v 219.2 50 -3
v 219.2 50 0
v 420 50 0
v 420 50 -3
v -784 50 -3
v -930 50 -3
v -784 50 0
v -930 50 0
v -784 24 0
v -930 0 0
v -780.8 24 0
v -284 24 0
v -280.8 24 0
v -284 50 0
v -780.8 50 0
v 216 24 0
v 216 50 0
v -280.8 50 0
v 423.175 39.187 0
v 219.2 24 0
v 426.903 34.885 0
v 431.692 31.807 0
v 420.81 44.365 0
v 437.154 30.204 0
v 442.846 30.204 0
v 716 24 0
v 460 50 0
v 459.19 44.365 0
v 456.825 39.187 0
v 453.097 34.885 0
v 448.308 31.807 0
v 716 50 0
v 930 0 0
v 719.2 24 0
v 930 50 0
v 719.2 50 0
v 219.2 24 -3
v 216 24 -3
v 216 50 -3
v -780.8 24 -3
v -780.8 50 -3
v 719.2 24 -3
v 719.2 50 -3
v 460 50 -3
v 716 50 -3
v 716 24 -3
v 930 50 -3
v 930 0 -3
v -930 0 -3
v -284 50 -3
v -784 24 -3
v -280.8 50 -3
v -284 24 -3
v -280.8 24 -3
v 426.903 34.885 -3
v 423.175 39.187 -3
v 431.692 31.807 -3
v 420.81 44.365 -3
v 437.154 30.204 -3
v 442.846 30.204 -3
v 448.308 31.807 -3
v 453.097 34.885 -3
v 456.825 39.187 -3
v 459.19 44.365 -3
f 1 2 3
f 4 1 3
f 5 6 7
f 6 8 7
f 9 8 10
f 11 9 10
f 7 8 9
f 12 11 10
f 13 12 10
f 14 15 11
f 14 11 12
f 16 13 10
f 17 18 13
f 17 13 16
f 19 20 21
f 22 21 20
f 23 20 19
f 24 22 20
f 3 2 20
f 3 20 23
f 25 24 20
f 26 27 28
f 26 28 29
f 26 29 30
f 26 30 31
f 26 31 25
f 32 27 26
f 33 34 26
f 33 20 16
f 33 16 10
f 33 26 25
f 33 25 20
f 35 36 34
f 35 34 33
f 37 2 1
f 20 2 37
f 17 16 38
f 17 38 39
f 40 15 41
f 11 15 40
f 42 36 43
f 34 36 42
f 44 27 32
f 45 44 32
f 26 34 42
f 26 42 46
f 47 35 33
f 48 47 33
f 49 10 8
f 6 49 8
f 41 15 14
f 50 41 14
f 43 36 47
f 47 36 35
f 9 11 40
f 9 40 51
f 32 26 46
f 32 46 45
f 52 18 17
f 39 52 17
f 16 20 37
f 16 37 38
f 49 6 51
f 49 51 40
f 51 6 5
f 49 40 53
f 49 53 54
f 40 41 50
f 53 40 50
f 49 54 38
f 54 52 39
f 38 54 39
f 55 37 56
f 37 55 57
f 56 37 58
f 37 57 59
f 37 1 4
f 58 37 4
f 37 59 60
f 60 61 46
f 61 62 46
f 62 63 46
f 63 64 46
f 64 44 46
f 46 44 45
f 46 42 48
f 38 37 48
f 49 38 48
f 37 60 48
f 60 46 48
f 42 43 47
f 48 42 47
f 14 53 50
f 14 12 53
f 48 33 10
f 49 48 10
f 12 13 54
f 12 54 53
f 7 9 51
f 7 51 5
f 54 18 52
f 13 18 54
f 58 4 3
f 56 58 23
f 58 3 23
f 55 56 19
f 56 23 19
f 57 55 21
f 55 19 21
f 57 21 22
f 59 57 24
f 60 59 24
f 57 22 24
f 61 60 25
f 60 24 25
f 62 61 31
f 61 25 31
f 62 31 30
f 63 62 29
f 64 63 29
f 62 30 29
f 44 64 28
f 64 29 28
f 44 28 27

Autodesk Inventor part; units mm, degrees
ref_plane "YZ Plane" through (0, 0, 0) normal (1, 0, 0) x (0, 1, 0)
ref_plane "XZ Plane" through (0, 0, 0) normal (0, 1, 0) x (-1, 0, 0)
ref_plane "XY Plane" through (0, 0, 0) normal (0, 0, 1) x (1, 0, 0)
sketch "Sketch8" plane through (0, 0, 0) normal (0, 0, 1) x (1, 0, 0)
  line L0 (-930, 50) -> (930, 50)
  line L1 (930, 50) -> (930, 0)
  line L2 (930, 0) -> (-930, 0)
  line L3 (-930, 0) -> (-930, 50)
  point P0 (0, 0)
  point P1 (0, 0)
  dimension "d37" = 50
  dimension "d38" = 1860
extrude "Plate5" add sketch "Sketch8" against normal blind 3
sketch "Sketch9" plane through (0, 0, 0) normal (0, 0, 1) x (1, 0, 0)
  line L0 (930, 50) -> (-930, 50) projected
  line L1 (-784, 50) -> (-780.8, 50)
  line L2 (-780.8, 50) -> (-780.8, 24)
  line L3 (-780.8, 24) -> (-784, 24)
  line L4 (-784, 24) -> (-784, 50)
  line L5 (-930, 50) -> (-930, 0) projected
  point P0 (0, 0)
  point P1 (-780.8, 50)
  dimension "d42" = 146
  dimension "d43" = 3.2
  dimension "d44" = 26
extrude "Extrusion3" cut sketch "Sketch9" against normal through all
pattern_linear "Rectangular Pattern2" count 6 spacing 500 along (1, 0, 0) of "Extrusion3"
sketch "Sketch10" plane through (0, 0, 0) normal (0, 0, 1) x (1, 0, 0)
  line L0 (930, 50) -> (719.2, 50) projected
  line L1 (719.2, 50) -> (719.2, 24) projected
  line L2 (719.2, 24) -> (716, 24) projected
  line L3 (716, 24) -> (716, 50) projected
  line L4 (716, 50) -> (219.2, 50) projected
  line L5 (219.2, 50) -> (219.2, 24) projected
  line L6 (219.2, 24) -> (216, 24) projected
  line L7 (216, 24) -> (216, 50) projected
  line L8 (216, 50) -> (-280.8, 50) projected
  line L9 (-280.8, 50) -> (-280.8, 24) projected
  line L10 (-280.8, 24) -> (-284, 24) projected
  line L11 (-284, 24) -> (-284, 50) projected
  line L12 (-284, 50) -> (-780.8, 50) projected
  line L13 (-780.8, 50) -> (-780.8, 24) projected
  line L14 (-780.8, 24) -> (-784, 24) projected
  line L15 (-784, 24) -> (-784, 50) projected
  line L16 (-784, 50) -> (-930, 50) projected
  line L17 (-930, 50) -> (-930, 0) projected
  line L18 (-930, 0) -> (930, 0) projected
  line L19 (930, 0) -> (930, 50) projected
  circle A0 centre (440, 50) radius 20
  point P0 (0, 0)
  point P1 (420, 50)
  point P2 (460, 50)
  point P3 (50, 50)
  point P4 (90, 50)
  dimension "d50" = 40
  dimension "d52" = 1370
extrude "Extrusion4" cut sketch "Sketch10" against normal through all contours A0 L4 | L4 A0
sketch "Sketch11" plane through (0, 0, 0) normal (0, 0, 1) x (1, 0, 0)
  line L0 (-752.5883, 29.3223) -> (-521.0772, 29.3223) construction
  line L1 (-521.0772, 29.3223) -> (-521.0772, 13.038) construction
  line L2 (-521.0772, 13.038) -> (-752.5883, 13.038) construction
  line L3 (-752.5883, 13.038) -> (-752.5883, 29.3223) construction
  point P0 (0, 0)
mark "Mark1"
equation "\"d41\" = Thickness"
equation "\"BendReliefWidth\" = Thickness"
equation "\"BendReliefDepth\" = 0.5 * Thickness"
equation "\"CornerReliefSize\" = 4 * Thickness"
equation "\"MinimumRemnant\" = 2 * Thickness"
equation "\"TransitionRadius\" = BendRadius"
equation "\"JacobiRadiusSize\" = BendRadius"
equation "\"GapSize\" = Thickness"
equation "\"Thickness\" = 3"
equation "\"BendRadius\" = 5"
properties part number "BSH 033 stringer floor 3" material "09g2s"
